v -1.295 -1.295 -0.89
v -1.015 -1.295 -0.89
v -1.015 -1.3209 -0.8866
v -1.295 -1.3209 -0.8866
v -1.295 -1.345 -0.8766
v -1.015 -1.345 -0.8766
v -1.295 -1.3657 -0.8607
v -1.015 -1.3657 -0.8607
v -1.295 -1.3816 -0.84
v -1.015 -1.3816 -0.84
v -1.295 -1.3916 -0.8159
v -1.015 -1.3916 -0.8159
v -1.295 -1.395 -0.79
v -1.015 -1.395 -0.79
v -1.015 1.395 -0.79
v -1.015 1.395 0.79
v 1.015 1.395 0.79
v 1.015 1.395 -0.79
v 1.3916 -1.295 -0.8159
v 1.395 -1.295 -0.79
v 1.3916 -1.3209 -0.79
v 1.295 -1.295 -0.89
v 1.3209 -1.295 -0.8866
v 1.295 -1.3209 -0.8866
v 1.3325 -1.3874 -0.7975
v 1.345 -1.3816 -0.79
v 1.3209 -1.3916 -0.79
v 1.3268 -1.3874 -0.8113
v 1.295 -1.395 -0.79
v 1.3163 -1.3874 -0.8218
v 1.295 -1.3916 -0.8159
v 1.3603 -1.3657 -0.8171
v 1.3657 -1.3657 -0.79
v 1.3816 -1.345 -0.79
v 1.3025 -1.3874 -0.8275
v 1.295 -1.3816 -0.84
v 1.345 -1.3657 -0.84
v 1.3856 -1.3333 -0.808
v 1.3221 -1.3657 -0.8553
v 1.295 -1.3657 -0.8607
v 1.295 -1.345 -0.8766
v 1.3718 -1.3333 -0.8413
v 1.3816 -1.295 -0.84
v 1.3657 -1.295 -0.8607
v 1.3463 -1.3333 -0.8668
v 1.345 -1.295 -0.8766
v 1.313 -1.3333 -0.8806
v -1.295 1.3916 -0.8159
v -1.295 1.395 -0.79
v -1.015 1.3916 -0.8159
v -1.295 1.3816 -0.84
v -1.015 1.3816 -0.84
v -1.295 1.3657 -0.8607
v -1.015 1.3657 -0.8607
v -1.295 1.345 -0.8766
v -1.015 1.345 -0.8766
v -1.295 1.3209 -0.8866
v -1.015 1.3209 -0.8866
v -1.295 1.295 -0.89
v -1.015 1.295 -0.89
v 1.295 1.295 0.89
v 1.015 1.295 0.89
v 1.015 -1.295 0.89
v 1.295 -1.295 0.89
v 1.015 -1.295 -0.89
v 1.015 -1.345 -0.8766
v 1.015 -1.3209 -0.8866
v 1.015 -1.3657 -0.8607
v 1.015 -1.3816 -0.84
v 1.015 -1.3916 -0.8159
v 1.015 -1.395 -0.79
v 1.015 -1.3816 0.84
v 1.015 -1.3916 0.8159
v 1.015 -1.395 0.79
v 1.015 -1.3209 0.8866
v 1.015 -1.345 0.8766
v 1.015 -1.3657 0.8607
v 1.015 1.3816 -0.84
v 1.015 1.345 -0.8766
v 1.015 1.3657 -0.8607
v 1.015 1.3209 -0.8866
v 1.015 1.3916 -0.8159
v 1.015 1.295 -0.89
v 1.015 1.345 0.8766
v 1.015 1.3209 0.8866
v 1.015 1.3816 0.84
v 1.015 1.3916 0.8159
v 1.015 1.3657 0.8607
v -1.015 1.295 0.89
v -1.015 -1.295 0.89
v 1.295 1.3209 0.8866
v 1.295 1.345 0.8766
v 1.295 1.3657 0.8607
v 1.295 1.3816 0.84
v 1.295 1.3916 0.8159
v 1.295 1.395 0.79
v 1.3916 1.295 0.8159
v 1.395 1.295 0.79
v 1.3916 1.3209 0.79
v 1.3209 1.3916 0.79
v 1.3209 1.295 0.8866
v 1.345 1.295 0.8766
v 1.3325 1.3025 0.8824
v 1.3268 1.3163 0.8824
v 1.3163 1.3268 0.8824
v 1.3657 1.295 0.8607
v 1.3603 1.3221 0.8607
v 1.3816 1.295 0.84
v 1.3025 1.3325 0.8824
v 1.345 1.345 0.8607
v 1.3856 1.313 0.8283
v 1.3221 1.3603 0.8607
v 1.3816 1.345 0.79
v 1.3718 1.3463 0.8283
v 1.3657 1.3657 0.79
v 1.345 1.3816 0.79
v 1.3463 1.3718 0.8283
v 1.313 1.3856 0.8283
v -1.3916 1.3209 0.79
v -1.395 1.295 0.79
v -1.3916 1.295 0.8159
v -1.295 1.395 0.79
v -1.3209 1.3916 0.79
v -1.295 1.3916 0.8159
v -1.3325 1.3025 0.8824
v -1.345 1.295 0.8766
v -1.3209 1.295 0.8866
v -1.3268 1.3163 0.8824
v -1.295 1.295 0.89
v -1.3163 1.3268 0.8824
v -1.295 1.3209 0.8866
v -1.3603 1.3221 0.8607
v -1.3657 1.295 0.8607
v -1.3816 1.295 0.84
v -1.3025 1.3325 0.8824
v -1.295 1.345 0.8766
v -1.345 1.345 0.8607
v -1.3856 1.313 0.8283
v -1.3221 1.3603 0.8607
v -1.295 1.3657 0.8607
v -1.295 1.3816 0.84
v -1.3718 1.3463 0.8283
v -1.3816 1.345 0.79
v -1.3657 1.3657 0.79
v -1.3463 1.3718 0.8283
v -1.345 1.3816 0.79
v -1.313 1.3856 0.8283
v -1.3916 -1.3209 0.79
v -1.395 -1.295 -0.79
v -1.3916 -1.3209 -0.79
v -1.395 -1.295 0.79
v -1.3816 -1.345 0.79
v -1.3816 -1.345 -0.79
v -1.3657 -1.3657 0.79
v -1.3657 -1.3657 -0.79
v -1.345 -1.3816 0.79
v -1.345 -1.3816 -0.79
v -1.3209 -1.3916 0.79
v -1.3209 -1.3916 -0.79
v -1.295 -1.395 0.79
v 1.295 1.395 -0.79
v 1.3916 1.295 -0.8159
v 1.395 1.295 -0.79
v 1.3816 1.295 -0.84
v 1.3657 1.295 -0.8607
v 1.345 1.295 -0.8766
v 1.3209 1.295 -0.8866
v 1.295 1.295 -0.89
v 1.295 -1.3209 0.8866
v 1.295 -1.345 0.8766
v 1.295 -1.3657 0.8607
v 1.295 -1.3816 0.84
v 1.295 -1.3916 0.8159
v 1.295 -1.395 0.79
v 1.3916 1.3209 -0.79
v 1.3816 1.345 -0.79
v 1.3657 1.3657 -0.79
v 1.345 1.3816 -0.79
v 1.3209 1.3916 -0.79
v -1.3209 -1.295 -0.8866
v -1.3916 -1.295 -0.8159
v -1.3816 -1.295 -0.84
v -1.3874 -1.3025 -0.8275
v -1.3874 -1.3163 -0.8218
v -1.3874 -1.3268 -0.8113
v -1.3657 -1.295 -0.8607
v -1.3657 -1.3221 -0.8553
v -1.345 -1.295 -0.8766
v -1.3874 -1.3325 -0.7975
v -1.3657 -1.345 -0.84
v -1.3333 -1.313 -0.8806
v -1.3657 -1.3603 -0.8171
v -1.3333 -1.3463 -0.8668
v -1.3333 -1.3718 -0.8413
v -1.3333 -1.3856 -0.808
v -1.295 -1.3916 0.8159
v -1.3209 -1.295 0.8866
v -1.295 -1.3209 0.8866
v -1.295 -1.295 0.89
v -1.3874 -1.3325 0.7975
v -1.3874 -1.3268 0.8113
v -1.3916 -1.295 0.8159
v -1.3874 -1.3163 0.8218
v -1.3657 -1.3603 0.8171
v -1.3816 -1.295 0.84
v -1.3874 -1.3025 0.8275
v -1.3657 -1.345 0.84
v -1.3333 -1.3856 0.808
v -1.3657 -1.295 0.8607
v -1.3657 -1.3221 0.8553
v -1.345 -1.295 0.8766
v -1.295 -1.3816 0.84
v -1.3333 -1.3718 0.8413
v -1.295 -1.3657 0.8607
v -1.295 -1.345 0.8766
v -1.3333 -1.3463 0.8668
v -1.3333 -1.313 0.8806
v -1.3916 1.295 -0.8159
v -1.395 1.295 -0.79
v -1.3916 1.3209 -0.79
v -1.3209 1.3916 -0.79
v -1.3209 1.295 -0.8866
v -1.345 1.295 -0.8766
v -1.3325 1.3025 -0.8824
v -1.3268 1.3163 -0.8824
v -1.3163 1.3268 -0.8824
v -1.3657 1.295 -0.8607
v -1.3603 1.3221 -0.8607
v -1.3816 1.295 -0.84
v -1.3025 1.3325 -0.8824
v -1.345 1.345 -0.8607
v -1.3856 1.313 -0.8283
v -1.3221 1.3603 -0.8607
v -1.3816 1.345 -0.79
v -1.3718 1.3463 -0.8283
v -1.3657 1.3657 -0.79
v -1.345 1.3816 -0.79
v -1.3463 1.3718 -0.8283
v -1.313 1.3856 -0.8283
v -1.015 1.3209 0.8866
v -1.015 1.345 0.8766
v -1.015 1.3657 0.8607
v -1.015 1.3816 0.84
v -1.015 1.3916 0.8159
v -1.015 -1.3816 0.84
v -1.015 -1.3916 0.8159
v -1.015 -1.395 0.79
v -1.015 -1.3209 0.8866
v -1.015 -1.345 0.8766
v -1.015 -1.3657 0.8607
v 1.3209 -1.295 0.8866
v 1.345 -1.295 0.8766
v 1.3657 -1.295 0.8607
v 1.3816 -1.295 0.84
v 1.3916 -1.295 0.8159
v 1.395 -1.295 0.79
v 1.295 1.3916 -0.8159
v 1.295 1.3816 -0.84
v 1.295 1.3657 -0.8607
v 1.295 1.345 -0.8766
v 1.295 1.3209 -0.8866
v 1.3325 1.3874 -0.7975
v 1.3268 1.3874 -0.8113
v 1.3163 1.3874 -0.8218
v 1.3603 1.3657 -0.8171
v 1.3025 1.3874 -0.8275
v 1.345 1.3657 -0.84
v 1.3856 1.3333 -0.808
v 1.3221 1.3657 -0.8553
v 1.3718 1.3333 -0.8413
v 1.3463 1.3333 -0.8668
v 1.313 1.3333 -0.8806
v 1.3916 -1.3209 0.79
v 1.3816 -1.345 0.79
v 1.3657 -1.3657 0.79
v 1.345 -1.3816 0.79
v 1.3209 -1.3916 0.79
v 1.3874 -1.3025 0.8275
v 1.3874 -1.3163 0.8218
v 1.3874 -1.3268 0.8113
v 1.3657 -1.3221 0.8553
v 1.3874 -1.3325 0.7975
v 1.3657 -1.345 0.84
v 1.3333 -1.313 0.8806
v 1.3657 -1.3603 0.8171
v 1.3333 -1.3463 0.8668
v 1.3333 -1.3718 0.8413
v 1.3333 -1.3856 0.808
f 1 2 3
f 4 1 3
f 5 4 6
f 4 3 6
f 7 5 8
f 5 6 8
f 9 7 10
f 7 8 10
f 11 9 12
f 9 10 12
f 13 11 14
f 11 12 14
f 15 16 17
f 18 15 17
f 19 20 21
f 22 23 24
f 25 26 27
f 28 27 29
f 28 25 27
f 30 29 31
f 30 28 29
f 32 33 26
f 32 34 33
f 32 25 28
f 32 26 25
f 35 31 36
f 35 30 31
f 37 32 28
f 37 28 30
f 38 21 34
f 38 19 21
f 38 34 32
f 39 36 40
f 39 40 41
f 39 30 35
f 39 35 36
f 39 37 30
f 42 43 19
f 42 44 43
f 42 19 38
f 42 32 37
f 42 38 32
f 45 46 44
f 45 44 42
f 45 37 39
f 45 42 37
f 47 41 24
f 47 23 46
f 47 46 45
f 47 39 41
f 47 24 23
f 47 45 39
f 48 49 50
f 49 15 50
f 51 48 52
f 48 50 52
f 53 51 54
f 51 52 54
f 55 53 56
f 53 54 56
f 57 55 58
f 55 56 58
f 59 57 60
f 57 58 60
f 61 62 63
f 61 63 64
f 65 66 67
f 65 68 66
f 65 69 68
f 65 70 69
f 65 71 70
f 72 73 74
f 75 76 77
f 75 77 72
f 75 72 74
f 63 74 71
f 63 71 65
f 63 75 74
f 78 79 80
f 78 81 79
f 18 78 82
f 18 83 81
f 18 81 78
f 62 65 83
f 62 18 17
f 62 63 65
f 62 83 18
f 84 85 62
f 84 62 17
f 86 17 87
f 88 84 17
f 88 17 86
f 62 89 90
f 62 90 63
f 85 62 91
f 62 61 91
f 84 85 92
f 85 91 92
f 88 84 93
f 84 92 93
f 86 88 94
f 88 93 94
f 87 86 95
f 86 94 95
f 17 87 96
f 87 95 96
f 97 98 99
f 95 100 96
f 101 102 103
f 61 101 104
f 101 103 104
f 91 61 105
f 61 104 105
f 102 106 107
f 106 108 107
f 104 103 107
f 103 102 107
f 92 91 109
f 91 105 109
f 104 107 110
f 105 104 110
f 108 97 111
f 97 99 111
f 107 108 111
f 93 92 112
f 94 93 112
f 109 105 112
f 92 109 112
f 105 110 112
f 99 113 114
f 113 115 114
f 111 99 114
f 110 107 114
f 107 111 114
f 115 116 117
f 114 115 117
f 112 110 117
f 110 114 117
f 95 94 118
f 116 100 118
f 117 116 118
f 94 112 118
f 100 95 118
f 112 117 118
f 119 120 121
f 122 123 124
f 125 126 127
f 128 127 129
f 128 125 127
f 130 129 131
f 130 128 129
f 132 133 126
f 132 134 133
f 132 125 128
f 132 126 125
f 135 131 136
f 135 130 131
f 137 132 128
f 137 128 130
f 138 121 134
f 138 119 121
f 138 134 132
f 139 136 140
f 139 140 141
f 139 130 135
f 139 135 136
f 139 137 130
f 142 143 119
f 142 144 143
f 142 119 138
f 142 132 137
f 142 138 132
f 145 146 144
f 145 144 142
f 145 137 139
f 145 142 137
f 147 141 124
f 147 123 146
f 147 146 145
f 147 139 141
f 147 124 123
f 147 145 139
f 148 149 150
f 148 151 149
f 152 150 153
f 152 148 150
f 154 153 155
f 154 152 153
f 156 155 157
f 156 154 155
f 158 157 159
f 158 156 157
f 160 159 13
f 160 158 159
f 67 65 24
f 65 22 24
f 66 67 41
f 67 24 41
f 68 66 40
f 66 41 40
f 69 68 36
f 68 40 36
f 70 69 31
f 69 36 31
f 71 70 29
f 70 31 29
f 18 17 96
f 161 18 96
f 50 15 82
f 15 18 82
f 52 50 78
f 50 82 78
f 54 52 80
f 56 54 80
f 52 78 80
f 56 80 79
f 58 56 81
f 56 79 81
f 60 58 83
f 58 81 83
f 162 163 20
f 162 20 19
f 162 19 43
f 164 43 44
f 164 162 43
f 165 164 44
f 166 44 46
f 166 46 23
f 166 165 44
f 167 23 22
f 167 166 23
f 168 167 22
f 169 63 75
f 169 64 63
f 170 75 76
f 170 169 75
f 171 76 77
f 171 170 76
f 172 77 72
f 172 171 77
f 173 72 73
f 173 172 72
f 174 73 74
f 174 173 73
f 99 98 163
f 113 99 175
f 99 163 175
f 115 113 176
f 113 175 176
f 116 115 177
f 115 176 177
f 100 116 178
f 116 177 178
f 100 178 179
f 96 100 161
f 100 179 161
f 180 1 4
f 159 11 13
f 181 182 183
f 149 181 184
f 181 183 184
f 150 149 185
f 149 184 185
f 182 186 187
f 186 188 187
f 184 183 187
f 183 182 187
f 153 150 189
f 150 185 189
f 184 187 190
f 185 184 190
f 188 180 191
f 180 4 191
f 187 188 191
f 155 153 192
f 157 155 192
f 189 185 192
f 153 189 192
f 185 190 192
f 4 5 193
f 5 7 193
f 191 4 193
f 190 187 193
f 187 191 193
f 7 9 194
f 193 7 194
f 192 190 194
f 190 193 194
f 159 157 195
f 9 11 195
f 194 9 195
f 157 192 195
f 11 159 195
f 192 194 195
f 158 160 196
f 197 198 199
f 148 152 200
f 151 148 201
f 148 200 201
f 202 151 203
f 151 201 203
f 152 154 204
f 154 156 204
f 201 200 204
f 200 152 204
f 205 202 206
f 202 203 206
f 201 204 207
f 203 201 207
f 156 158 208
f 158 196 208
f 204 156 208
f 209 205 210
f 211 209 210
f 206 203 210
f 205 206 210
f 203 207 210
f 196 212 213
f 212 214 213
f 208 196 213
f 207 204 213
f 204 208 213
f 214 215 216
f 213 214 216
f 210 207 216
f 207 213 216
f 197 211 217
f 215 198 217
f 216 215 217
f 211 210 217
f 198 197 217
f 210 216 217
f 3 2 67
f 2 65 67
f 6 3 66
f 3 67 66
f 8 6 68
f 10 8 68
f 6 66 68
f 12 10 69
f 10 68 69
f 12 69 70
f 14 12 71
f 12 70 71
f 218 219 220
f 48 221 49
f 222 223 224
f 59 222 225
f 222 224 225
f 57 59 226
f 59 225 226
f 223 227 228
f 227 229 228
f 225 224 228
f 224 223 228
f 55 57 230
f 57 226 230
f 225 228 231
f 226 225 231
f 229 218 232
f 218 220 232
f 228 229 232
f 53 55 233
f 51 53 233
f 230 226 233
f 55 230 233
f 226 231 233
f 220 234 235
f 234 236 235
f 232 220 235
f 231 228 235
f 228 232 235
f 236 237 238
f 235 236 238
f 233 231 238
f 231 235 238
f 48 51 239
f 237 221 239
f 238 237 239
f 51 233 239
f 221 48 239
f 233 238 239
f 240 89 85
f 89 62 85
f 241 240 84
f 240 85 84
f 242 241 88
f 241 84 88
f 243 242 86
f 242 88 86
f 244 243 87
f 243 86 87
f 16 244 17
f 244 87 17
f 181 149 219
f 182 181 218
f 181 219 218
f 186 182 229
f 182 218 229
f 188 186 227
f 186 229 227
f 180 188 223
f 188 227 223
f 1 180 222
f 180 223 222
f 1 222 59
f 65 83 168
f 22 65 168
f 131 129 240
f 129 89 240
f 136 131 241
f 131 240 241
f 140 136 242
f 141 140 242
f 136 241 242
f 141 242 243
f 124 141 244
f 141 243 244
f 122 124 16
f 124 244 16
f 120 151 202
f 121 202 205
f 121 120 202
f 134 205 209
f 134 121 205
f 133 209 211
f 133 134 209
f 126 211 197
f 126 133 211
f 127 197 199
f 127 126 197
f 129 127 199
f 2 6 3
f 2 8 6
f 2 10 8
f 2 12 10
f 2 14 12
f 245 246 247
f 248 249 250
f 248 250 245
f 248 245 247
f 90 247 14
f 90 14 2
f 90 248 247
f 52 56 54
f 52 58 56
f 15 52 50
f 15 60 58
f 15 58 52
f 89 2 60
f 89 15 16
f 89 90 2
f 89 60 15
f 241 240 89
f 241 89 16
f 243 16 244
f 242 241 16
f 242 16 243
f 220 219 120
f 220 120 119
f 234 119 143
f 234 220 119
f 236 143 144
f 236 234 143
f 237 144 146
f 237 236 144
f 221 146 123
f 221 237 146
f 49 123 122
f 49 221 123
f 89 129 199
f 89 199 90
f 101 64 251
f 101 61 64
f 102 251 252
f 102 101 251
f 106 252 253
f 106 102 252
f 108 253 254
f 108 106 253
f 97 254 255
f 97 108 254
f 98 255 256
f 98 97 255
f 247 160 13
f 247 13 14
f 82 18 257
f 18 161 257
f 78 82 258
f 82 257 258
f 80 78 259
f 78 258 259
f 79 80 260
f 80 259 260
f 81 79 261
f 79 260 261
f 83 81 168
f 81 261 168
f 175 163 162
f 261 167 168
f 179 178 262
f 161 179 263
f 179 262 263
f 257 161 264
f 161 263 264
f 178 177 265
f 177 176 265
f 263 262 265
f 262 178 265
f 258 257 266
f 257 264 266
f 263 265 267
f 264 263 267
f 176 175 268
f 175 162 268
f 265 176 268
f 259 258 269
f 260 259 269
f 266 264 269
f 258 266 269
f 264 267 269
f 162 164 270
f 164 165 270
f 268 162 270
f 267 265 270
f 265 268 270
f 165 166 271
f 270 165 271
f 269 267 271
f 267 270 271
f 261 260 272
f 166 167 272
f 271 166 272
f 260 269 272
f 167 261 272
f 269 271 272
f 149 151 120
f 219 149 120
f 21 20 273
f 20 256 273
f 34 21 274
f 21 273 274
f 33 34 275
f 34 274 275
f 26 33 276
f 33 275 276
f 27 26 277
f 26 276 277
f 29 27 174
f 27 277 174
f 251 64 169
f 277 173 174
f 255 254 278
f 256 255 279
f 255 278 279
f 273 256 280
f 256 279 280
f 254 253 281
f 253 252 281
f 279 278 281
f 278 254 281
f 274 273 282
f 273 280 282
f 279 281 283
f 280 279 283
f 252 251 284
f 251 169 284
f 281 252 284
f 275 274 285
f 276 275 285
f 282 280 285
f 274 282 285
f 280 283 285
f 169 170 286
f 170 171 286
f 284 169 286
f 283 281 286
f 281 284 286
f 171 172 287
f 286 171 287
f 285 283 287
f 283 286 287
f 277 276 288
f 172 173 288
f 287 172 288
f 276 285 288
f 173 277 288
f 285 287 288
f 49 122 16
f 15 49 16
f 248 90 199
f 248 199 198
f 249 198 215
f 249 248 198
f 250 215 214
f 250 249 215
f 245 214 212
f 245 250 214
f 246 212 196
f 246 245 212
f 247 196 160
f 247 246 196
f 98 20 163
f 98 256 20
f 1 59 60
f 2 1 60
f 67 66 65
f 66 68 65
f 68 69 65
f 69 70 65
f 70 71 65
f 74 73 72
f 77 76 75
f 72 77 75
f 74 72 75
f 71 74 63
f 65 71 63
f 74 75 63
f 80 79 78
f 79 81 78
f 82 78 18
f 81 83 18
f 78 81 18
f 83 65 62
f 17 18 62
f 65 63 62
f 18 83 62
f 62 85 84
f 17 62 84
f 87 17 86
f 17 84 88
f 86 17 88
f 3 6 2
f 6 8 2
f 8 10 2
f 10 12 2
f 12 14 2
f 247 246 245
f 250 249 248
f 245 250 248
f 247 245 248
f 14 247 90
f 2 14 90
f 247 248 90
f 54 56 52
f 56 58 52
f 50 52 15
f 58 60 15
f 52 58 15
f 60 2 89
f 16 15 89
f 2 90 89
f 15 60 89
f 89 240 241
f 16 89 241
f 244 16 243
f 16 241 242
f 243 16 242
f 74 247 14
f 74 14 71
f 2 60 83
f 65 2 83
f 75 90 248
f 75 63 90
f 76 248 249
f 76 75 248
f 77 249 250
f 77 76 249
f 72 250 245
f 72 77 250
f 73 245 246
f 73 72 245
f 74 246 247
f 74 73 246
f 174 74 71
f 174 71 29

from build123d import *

# Parameters (mm, degrees)
F2_W     = 2.03
F2_H     = 2.79
F3_DEPTH = 0.89
F2_W_2   = 0.38
F4_DEPTH = 0.89
F5_DEPTH = 0.89
F6_R     = 0.1
F6_2_R   = 0.1
F6_3_R   = 0.1


with BuildPart() as f3:
    # F2 (on Top) → F3 (new body, symmetric)
    with BuildSketch(Plane.XY):
        Rectangle(F2_W, F2_H)
    extrude(amount=F3_DEPTH, both=True)

    # F6#2
    f6_2_edges = [f3.edges().sort_by_distance(p)[0] for p in [
        (0, -1.395, 0.89),
        (0, -1.395, -0.89),
        (0, 1.395, 0.89),
        (0, 1.395, -0.89),
    ]]
    fillet(f6_2_edges, radius=F6_2_R)


with BuildPart() as f4:
    # F2 (on Top) → F4 (new body, symmetric)
    with BuildSketch(Plane.XY):
        with Locations((-1.205, 0)):
            Rectangle(F2_W_2, F2_H)
    extrude(amount=F4_DEPTH, both=True)

    # F6
    f6_edges = [f4.edges().sort_by_distance(p)[0] for p in [
        (-1.205, -1.395, 0.89),
        (-1.205, -1.395, -0.89),
        (-1.395, 1.395, 0),
        (-1.395, 0, -0.89),
        (-1.395, -1.395, 0),
        (-1.395, 0, 0.89),
        (-1.205, 1.395, -0.89),
        (-1.205, 1.395, 0.89),
    ]]
    fillet(f6_edges, radius=F6_R)


with BuildPart() as f5:
    # F2 (on Top) → F5 (new body, symmetric)
    with BuildSketch(Plane.XY):
        with Locations((1.205, 0)):
            Rectangle(F2_W_2, F2_H)
    extrude(amount=F5_DEPTH, both=True)

    # F6#3
    f6_3_edges = [f5.edges().sort_by_distance(p)[0] for p in [
        (1.205, -1.395, 0.89),
        (1.395, 0, -0.89),
        (1.395, 1.395, 0),
        (1.395, 0, 0.89),
        (1.395, -1.395, 0),
        (1.205, -1.395, -0.89),
        (1.205, 1.395, 0.89),
        (1.205, 1.395, -0.89),
    ]]
    fillet(f6_3_edges, radius=F6_3_R)


solid = Compound([f3.part, f4.part, f5.part])
